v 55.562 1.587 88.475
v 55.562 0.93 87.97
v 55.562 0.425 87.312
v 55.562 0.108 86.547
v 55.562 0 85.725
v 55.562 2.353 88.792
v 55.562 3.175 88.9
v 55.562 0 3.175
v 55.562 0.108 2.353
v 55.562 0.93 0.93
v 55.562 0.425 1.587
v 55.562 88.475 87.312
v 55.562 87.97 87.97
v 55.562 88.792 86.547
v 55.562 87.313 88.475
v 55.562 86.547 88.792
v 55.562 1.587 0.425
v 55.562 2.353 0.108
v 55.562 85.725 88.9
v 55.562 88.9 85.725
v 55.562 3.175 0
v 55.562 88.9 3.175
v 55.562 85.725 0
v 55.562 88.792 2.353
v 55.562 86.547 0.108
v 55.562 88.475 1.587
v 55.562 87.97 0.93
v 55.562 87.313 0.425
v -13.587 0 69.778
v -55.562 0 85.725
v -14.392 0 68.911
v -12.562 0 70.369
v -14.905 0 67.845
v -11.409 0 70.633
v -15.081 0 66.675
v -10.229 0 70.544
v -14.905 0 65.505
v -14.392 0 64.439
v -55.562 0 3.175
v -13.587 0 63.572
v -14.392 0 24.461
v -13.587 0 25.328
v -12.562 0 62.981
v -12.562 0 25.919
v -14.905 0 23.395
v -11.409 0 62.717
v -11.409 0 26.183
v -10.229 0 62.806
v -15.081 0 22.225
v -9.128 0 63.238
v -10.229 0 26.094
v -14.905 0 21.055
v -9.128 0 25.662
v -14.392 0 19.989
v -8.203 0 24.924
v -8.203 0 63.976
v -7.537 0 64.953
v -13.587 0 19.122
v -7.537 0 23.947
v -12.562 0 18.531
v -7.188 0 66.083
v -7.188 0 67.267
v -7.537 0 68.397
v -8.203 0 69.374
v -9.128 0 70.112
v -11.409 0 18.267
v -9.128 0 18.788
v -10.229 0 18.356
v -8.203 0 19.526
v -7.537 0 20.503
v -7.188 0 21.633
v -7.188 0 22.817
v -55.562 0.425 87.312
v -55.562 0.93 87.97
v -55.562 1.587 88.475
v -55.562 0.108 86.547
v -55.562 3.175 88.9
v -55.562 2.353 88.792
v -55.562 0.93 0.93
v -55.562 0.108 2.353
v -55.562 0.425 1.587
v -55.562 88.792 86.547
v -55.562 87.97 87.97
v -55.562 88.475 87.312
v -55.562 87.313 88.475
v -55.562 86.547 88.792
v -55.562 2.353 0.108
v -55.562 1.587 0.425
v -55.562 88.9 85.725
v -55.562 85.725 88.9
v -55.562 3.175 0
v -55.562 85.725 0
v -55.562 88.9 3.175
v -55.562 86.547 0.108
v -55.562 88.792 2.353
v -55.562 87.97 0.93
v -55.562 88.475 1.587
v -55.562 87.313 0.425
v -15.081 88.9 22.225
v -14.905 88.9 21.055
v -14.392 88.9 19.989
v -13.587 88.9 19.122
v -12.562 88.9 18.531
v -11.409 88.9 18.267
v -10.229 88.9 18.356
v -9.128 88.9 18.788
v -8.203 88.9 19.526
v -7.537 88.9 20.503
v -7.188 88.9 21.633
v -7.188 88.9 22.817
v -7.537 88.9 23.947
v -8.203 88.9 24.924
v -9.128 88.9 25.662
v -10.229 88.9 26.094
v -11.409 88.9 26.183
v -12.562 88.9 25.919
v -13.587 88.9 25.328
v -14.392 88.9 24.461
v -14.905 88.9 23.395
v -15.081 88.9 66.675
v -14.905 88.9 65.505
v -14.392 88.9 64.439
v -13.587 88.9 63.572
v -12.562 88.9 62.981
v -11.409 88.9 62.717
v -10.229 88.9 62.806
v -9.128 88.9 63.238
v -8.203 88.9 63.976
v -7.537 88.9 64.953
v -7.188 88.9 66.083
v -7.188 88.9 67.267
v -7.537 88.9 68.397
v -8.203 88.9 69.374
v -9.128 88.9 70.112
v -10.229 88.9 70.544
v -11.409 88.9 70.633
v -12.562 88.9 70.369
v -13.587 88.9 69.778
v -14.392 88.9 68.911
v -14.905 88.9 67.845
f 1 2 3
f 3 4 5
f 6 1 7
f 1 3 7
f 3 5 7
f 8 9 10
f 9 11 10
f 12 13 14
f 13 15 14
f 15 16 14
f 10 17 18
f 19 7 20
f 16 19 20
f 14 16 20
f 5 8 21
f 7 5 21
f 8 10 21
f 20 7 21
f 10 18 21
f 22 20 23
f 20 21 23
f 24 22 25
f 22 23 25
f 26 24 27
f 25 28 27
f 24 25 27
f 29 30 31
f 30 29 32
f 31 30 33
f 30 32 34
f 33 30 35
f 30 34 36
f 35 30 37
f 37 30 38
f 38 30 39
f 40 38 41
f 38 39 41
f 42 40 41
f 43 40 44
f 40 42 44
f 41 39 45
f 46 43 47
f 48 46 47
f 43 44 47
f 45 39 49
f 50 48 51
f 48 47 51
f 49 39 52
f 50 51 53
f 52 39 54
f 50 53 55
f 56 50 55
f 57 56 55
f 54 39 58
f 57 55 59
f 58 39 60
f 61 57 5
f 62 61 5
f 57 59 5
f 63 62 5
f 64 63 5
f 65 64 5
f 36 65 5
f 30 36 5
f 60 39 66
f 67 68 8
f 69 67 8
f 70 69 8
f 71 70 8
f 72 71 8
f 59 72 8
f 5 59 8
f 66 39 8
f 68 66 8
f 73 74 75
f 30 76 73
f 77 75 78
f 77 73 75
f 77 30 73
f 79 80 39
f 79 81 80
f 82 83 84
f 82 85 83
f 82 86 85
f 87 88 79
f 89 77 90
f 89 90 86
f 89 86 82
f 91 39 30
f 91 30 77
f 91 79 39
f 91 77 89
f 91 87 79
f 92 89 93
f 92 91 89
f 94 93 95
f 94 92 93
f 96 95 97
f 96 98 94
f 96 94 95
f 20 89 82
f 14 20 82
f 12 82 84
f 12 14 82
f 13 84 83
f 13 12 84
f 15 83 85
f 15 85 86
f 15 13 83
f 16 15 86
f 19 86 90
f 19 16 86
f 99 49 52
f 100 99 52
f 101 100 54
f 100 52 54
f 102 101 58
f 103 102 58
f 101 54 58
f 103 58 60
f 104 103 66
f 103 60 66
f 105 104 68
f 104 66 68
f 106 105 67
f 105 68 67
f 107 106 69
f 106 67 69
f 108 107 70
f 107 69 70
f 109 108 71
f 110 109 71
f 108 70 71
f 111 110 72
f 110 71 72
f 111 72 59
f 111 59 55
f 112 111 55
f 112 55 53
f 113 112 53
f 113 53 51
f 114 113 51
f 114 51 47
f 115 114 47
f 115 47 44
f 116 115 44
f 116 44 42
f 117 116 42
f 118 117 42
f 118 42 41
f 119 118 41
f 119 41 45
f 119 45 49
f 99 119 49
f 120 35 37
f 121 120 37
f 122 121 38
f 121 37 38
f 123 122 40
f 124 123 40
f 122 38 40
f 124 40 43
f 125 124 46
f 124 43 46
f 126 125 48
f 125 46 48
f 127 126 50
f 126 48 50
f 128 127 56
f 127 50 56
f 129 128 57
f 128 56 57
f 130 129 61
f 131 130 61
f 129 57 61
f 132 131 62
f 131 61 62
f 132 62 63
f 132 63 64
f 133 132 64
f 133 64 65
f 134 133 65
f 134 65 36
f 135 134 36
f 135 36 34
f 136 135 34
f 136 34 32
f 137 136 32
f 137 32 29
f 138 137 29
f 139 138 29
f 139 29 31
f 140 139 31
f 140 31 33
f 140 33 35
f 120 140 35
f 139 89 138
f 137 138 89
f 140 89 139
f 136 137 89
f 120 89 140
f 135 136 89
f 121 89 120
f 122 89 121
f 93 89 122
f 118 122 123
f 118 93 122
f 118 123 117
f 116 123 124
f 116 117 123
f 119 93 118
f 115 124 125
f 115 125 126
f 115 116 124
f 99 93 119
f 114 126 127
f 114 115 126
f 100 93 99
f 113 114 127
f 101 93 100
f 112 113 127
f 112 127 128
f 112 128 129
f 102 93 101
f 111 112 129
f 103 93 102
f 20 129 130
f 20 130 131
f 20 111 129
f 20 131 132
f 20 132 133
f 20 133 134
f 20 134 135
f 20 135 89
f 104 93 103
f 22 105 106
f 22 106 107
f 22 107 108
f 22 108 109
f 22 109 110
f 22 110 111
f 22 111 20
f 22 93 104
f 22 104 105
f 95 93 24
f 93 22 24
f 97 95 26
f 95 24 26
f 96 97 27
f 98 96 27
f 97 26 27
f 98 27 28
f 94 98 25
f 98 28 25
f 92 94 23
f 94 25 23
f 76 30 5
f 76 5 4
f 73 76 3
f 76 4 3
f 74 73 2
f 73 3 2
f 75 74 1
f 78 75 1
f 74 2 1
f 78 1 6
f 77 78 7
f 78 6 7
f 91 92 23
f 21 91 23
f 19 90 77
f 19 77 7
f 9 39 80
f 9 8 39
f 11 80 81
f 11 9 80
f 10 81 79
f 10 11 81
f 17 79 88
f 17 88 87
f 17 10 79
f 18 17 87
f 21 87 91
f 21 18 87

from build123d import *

# Parameters (mm, degrees)
SKETCH1_W                      = 111.125
SKETCH1_H                      = 88.9
BOSS_EXTRUDE1_DEPTH            = 88.9
FILLET1_R                      = 3.175
F_5_16_0_3125_DIAMETER_HOLE1_D = 7.9375


with BuildPart() as part:
    # Sketch1 → Boss-Extrude1 (new body)
    with BuildSketch(Plane.XY):
        with Locations((0, 44.45)):
            Rectangle(SKETCH1_W, SKETCH1_H)
    extrude(amount=BOSS_EXTRUDE1_DEPTH)

    # Fillet1
    fillet1_edges = [part.edges().sort_by_distance(p)[0] for p in [
        (0, 88.9, 88.9),
        (0, 88.9, 0),
        (0, 0, 0),
        (0, 0, 88.9),
    ]]
    fillet(fillet1_edges, radius=FILLET1_R)

    # 5/16 (0.3125) Diameter Hole1 (through all)
    with Locations(Plane(origin=(0, 88.9, 0), x_dir=(1, 0, 0), z_dir=(0, 1, 0))):
        with Locations((-11.1125, -22.225), (-11.1125, -66.675)):
            Hole(F_5_16_0_3125_DIAMETER_HOLE1_D / 2)


solid = part.part
